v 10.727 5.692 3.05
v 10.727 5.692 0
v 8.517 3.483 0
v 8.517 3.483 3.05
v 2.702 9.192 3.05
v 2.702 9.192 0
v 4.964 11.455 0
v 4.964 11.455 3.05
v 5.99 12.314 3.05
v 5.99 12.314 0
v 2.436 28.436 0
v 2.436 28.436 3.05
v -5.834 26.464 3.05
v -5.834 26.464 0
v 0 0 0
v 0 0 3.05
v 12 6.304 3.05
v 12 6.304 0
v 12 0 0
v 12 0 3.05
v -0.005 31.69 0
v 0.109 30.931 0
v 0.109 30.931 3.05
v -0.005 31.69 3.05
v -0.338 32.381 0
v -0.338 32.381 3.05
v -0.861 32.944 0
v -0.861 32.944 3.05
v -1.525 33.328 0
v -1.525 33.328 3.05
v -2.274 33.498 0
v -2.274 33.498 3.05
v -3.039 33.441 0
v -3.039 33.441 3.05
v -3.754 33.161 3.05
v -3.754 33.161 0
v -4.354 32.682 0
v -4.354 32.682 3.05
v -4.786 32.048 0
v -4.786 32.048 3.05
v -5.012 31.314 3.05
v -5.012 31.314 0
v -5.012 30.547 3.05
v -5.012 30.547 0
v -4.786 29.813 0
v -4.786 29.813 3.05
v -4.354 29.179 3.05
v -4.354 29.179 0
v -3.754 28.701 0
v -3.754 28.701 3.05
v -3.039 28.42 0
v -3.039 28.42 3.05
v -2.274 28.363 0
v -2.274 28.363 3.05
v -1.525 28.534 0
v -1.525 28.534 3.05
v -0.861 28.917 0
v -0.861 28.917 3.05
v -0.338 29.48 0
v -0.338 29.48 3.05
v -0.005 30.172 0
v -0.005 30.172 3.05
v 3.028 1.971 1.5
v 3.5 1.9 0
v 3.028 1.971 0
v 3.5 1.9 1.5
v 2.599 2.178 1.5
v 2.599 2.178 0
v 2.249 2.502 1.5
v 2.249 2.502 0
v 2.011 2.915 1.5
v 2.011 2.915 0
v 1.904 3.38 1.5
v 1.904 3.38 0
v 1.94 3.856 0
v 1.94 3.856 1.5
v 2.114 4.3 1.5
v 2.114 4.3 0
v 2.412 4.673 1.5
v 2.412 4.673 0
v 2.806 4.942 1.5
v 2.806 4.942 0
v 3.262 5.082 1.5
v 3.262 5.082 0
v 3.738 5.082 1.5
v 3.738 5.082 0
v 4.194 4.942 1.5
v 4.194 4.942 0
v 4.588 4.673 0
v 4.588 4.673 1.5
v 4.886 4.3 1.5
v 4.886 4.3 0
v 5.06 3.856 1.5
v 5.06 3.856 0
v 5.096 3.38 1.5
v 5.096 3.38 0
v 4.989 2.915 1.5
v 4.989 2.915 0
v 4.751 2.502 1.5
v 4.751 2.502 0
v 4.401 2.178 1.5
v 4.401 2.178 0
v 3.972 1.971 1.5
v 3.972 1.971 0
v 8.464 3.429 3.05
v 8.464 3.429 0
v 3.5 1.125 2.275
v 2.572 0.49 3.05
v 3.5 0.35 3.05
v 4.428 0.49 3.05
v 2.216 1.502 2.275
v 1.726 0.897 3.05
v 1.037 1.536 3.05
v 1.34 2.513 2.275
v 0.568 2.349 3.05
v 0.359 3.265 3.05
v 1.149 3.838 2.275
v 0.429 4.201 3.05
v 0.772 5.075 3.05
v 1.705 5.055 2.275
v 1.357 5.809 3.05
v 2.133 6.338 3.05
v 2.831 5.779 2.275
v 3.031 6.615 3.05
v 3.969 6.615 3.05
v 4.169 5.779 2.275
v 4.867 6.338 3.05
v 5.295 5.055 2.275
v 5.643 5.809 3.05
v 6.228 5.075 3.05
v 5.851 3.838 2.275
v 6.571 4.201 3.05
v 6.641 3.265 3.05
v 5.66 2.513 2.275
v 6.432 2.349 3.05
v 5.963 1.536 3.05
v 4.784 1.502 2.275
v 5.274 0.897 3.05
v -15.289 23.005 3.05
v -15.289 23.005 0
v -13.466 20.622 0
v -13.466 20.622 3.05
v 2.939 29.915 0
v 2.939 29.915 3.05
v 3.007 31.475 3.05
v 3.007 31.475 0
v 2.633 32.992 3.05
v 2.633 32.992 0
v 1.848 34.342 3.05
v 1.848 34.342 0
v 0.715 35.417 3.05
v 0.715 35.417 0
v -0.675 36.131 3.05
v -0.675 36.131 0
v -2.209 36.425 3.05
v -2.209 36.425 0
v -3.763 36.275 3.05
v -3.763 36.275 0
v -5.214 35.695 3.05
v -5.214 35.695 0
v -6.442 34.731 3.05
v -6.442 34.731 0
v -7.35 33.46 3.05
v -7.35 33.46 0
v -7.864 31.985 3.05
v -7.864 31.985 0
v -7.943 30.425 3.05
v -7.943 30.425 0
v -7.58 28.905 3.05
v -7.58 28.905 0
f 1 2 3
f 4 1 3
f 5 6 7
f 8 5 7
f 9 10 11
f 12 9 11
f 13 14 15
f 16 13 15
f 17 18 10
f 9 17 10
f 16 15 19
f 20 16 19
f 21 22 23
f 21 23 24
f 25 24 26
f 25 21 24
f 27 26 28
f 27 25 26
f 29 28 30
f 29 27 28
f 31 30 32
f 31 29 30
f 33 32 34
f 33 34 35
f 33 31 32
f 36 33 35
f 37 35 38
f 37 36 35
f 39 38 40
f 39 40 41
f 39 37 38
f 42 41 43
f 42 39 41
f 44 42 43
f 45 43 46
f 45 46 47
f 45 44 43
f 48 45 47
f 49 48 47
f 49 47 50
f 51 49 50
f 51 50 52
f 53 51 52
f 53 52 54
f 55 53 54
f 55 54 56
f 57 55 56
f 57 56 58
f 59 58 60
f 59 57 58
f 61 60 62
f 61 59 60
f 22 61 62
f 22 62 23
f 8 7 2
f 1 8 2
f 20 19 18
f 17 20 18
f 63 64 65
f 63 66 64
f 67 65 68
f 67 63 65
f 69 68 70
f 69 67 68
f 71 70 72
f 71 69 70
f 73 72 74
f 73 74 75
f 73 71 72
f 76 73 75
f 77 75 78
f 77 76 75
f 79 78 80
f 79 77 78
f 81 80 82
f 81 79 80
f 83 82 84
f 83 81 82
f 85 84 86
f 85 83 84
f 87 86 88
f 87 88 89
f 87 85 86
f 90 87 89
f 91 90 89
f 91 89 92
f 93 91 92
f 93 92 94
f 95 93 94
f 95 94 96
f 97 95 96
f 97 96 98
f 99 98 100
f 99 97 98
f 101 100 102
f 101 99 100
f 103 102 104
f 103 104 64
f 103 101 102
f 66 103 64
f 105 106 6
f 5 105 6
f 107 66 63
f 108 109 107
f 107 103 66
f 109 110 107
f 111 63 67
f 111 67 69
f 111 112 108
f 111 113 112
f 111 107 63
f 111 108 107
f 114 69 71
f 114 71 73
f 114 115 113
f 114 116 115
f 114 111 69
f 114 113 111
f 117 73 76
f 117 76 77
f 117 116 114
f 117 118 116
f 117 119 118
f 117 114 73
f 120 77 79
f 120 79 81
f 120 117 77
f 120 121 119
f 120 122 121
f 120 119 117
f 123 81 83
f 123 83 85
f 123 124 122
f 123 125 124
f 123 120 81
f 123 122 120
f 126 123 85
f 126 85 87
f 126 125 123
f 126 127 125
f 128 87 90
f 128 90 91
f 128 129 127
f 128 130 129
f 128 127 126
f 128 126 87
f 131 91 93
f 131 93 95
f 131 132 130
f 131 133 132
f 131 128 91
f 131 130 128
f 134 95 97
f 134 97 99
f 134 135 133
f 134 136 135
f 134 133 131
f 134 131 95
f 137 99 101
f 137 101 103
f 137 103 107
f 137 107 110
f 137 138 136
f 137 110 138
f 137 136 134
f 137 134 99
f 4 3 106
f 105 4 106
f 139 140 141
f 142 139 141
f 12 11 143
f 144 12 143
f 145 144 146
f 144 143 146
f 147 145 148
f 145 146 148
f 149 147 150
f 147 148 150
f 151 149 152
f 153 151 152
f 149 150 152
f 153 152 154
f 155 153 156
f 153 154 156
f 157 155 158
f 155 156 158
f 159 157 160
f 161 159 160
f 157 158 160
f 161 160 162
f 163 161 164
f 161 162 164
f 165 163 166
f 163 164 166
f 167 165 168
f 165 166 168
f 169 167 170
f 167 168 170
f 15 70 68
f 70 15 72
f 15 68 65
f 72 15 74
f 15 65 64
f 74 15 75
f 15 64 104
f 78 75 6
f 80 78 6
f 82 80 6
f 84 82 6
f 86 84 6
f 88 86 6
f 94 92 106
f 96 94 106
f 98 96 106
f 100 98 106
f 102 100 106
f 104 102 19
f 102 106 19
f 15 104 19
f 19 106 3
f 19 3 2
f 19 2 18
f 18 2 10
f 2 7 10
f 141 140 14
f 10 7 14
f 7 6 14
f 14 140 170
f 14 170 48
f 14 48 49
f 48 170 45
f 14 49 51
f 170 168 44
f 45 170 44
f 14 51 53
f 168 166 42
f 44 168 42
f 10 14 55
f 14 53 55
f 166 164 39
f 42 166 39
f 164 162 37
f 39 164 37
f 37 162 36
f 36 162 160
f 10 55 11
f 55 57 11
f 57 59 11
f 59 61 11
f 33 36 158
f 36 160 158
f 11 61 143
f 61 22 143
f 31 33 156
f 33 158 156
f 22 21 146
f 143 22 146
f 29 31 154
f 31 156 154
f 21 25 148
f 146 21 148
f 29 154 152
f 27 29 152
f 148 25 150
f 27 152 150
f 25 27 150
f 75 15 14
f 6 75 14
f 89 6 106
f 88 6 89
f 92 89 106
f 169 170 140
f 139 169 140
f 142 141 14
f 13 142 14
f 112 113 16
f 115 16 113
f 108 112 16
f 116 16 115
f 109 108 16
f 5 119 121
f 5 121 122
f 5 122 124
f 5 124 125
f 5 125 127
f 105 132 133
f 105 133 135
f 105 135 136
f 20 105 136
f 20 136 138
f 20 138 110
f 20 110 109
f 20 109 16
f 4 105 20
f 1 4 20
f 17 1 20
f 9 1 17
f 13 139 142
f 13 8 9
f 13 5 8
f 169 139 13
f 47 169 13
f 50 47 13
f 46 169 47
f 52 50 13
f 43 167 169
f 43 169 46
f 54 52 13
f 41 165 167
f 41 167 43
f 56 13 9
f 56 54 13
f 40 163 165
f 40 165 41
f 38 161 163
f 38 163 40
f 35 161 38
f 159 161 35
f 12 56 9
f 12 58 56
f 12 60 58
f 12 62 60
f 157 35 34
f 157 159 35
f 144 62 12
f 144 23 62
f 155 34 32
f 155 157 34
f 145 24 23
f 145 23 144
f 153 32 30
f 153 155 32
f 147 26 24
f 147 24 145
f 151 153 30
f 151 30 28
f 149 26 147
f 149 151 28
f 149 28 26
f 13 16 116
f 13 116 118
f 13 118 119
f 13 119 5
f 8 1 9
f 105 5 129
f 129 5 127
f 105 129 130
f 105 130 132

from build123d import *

# Parameters (mm, degrees)
SKETCH1_R           = 1.5
SKETCH1_R_2         = 2.575
BOSS_EXTRUDE1_DEPTH = 3.05


with BuildPart() as part:
    # Sketch1 → Boss-Extrude1 (new body)
    with BuildSketch(Plane.XY):
        with BuildLine():
            Line((5.98959236, 12.314316255), (2.43581293, 28.4362191))
            ThreePointArc((2.43581293, 28.4362191), (-2.208633676, 36.424535456), (-7.57966444, 28.905485582))
            Line((-7.57966444, 28.905485582), (-15.289043869, 23.004605125))
            Line((-15.289043869, 23.004605125), (-13.465626641, 20.622347873))
            Line((-13.465626641, 20.622347873), (-5.833523684, 26.464079701))
            Line((-5.833523684, 26.464079701), (0, 0))
            Line((0, 0), (12, 0))
            Line((12, 0), (12, 6.303908615))
            Line((12, 6.303908615), (5.98959236, 12.314316255))
        make_face()
        with Locations((3.5, 3.5)):
            Circle(SKETCH1_R, mode=Mode.SUBTRACT)
        Polygon((10.727207794, 5.692209589), (8.517499103, 3.482500897), (8.464466094, 3.429467889), (2.701545827, 9.192388155), (4.964287527, 11.455129855), align=None, mode=Mode.SUBTRACT)
        with Locations((-2.466048994, 30.930562636)):
            Circle(SKETCH1_R_2, mode=Mode.SUBTRACT)
    extrude(amount=BOSS_EXTRUDE1_DEPTH)

    # Sketch3 → CSK for M3 Flat Head Machine Screw1 (revolve, cut)
    with BuildSketch(Plane(origin=(3.5, 3.5, 3.05), x_dir=(0, -1, 0), z_dir=(1, 0, 0))):
        Polygon((0, 0), (0, 3.05), (1.6, 3.05), (1.6, 1.55), (3.15, 0), align=None)
    revolve(axis=Axis((3.5, 3.5, 9.4), (0, 0, -1)), mode=Mode.SUBTRACT)


solid = part.part
